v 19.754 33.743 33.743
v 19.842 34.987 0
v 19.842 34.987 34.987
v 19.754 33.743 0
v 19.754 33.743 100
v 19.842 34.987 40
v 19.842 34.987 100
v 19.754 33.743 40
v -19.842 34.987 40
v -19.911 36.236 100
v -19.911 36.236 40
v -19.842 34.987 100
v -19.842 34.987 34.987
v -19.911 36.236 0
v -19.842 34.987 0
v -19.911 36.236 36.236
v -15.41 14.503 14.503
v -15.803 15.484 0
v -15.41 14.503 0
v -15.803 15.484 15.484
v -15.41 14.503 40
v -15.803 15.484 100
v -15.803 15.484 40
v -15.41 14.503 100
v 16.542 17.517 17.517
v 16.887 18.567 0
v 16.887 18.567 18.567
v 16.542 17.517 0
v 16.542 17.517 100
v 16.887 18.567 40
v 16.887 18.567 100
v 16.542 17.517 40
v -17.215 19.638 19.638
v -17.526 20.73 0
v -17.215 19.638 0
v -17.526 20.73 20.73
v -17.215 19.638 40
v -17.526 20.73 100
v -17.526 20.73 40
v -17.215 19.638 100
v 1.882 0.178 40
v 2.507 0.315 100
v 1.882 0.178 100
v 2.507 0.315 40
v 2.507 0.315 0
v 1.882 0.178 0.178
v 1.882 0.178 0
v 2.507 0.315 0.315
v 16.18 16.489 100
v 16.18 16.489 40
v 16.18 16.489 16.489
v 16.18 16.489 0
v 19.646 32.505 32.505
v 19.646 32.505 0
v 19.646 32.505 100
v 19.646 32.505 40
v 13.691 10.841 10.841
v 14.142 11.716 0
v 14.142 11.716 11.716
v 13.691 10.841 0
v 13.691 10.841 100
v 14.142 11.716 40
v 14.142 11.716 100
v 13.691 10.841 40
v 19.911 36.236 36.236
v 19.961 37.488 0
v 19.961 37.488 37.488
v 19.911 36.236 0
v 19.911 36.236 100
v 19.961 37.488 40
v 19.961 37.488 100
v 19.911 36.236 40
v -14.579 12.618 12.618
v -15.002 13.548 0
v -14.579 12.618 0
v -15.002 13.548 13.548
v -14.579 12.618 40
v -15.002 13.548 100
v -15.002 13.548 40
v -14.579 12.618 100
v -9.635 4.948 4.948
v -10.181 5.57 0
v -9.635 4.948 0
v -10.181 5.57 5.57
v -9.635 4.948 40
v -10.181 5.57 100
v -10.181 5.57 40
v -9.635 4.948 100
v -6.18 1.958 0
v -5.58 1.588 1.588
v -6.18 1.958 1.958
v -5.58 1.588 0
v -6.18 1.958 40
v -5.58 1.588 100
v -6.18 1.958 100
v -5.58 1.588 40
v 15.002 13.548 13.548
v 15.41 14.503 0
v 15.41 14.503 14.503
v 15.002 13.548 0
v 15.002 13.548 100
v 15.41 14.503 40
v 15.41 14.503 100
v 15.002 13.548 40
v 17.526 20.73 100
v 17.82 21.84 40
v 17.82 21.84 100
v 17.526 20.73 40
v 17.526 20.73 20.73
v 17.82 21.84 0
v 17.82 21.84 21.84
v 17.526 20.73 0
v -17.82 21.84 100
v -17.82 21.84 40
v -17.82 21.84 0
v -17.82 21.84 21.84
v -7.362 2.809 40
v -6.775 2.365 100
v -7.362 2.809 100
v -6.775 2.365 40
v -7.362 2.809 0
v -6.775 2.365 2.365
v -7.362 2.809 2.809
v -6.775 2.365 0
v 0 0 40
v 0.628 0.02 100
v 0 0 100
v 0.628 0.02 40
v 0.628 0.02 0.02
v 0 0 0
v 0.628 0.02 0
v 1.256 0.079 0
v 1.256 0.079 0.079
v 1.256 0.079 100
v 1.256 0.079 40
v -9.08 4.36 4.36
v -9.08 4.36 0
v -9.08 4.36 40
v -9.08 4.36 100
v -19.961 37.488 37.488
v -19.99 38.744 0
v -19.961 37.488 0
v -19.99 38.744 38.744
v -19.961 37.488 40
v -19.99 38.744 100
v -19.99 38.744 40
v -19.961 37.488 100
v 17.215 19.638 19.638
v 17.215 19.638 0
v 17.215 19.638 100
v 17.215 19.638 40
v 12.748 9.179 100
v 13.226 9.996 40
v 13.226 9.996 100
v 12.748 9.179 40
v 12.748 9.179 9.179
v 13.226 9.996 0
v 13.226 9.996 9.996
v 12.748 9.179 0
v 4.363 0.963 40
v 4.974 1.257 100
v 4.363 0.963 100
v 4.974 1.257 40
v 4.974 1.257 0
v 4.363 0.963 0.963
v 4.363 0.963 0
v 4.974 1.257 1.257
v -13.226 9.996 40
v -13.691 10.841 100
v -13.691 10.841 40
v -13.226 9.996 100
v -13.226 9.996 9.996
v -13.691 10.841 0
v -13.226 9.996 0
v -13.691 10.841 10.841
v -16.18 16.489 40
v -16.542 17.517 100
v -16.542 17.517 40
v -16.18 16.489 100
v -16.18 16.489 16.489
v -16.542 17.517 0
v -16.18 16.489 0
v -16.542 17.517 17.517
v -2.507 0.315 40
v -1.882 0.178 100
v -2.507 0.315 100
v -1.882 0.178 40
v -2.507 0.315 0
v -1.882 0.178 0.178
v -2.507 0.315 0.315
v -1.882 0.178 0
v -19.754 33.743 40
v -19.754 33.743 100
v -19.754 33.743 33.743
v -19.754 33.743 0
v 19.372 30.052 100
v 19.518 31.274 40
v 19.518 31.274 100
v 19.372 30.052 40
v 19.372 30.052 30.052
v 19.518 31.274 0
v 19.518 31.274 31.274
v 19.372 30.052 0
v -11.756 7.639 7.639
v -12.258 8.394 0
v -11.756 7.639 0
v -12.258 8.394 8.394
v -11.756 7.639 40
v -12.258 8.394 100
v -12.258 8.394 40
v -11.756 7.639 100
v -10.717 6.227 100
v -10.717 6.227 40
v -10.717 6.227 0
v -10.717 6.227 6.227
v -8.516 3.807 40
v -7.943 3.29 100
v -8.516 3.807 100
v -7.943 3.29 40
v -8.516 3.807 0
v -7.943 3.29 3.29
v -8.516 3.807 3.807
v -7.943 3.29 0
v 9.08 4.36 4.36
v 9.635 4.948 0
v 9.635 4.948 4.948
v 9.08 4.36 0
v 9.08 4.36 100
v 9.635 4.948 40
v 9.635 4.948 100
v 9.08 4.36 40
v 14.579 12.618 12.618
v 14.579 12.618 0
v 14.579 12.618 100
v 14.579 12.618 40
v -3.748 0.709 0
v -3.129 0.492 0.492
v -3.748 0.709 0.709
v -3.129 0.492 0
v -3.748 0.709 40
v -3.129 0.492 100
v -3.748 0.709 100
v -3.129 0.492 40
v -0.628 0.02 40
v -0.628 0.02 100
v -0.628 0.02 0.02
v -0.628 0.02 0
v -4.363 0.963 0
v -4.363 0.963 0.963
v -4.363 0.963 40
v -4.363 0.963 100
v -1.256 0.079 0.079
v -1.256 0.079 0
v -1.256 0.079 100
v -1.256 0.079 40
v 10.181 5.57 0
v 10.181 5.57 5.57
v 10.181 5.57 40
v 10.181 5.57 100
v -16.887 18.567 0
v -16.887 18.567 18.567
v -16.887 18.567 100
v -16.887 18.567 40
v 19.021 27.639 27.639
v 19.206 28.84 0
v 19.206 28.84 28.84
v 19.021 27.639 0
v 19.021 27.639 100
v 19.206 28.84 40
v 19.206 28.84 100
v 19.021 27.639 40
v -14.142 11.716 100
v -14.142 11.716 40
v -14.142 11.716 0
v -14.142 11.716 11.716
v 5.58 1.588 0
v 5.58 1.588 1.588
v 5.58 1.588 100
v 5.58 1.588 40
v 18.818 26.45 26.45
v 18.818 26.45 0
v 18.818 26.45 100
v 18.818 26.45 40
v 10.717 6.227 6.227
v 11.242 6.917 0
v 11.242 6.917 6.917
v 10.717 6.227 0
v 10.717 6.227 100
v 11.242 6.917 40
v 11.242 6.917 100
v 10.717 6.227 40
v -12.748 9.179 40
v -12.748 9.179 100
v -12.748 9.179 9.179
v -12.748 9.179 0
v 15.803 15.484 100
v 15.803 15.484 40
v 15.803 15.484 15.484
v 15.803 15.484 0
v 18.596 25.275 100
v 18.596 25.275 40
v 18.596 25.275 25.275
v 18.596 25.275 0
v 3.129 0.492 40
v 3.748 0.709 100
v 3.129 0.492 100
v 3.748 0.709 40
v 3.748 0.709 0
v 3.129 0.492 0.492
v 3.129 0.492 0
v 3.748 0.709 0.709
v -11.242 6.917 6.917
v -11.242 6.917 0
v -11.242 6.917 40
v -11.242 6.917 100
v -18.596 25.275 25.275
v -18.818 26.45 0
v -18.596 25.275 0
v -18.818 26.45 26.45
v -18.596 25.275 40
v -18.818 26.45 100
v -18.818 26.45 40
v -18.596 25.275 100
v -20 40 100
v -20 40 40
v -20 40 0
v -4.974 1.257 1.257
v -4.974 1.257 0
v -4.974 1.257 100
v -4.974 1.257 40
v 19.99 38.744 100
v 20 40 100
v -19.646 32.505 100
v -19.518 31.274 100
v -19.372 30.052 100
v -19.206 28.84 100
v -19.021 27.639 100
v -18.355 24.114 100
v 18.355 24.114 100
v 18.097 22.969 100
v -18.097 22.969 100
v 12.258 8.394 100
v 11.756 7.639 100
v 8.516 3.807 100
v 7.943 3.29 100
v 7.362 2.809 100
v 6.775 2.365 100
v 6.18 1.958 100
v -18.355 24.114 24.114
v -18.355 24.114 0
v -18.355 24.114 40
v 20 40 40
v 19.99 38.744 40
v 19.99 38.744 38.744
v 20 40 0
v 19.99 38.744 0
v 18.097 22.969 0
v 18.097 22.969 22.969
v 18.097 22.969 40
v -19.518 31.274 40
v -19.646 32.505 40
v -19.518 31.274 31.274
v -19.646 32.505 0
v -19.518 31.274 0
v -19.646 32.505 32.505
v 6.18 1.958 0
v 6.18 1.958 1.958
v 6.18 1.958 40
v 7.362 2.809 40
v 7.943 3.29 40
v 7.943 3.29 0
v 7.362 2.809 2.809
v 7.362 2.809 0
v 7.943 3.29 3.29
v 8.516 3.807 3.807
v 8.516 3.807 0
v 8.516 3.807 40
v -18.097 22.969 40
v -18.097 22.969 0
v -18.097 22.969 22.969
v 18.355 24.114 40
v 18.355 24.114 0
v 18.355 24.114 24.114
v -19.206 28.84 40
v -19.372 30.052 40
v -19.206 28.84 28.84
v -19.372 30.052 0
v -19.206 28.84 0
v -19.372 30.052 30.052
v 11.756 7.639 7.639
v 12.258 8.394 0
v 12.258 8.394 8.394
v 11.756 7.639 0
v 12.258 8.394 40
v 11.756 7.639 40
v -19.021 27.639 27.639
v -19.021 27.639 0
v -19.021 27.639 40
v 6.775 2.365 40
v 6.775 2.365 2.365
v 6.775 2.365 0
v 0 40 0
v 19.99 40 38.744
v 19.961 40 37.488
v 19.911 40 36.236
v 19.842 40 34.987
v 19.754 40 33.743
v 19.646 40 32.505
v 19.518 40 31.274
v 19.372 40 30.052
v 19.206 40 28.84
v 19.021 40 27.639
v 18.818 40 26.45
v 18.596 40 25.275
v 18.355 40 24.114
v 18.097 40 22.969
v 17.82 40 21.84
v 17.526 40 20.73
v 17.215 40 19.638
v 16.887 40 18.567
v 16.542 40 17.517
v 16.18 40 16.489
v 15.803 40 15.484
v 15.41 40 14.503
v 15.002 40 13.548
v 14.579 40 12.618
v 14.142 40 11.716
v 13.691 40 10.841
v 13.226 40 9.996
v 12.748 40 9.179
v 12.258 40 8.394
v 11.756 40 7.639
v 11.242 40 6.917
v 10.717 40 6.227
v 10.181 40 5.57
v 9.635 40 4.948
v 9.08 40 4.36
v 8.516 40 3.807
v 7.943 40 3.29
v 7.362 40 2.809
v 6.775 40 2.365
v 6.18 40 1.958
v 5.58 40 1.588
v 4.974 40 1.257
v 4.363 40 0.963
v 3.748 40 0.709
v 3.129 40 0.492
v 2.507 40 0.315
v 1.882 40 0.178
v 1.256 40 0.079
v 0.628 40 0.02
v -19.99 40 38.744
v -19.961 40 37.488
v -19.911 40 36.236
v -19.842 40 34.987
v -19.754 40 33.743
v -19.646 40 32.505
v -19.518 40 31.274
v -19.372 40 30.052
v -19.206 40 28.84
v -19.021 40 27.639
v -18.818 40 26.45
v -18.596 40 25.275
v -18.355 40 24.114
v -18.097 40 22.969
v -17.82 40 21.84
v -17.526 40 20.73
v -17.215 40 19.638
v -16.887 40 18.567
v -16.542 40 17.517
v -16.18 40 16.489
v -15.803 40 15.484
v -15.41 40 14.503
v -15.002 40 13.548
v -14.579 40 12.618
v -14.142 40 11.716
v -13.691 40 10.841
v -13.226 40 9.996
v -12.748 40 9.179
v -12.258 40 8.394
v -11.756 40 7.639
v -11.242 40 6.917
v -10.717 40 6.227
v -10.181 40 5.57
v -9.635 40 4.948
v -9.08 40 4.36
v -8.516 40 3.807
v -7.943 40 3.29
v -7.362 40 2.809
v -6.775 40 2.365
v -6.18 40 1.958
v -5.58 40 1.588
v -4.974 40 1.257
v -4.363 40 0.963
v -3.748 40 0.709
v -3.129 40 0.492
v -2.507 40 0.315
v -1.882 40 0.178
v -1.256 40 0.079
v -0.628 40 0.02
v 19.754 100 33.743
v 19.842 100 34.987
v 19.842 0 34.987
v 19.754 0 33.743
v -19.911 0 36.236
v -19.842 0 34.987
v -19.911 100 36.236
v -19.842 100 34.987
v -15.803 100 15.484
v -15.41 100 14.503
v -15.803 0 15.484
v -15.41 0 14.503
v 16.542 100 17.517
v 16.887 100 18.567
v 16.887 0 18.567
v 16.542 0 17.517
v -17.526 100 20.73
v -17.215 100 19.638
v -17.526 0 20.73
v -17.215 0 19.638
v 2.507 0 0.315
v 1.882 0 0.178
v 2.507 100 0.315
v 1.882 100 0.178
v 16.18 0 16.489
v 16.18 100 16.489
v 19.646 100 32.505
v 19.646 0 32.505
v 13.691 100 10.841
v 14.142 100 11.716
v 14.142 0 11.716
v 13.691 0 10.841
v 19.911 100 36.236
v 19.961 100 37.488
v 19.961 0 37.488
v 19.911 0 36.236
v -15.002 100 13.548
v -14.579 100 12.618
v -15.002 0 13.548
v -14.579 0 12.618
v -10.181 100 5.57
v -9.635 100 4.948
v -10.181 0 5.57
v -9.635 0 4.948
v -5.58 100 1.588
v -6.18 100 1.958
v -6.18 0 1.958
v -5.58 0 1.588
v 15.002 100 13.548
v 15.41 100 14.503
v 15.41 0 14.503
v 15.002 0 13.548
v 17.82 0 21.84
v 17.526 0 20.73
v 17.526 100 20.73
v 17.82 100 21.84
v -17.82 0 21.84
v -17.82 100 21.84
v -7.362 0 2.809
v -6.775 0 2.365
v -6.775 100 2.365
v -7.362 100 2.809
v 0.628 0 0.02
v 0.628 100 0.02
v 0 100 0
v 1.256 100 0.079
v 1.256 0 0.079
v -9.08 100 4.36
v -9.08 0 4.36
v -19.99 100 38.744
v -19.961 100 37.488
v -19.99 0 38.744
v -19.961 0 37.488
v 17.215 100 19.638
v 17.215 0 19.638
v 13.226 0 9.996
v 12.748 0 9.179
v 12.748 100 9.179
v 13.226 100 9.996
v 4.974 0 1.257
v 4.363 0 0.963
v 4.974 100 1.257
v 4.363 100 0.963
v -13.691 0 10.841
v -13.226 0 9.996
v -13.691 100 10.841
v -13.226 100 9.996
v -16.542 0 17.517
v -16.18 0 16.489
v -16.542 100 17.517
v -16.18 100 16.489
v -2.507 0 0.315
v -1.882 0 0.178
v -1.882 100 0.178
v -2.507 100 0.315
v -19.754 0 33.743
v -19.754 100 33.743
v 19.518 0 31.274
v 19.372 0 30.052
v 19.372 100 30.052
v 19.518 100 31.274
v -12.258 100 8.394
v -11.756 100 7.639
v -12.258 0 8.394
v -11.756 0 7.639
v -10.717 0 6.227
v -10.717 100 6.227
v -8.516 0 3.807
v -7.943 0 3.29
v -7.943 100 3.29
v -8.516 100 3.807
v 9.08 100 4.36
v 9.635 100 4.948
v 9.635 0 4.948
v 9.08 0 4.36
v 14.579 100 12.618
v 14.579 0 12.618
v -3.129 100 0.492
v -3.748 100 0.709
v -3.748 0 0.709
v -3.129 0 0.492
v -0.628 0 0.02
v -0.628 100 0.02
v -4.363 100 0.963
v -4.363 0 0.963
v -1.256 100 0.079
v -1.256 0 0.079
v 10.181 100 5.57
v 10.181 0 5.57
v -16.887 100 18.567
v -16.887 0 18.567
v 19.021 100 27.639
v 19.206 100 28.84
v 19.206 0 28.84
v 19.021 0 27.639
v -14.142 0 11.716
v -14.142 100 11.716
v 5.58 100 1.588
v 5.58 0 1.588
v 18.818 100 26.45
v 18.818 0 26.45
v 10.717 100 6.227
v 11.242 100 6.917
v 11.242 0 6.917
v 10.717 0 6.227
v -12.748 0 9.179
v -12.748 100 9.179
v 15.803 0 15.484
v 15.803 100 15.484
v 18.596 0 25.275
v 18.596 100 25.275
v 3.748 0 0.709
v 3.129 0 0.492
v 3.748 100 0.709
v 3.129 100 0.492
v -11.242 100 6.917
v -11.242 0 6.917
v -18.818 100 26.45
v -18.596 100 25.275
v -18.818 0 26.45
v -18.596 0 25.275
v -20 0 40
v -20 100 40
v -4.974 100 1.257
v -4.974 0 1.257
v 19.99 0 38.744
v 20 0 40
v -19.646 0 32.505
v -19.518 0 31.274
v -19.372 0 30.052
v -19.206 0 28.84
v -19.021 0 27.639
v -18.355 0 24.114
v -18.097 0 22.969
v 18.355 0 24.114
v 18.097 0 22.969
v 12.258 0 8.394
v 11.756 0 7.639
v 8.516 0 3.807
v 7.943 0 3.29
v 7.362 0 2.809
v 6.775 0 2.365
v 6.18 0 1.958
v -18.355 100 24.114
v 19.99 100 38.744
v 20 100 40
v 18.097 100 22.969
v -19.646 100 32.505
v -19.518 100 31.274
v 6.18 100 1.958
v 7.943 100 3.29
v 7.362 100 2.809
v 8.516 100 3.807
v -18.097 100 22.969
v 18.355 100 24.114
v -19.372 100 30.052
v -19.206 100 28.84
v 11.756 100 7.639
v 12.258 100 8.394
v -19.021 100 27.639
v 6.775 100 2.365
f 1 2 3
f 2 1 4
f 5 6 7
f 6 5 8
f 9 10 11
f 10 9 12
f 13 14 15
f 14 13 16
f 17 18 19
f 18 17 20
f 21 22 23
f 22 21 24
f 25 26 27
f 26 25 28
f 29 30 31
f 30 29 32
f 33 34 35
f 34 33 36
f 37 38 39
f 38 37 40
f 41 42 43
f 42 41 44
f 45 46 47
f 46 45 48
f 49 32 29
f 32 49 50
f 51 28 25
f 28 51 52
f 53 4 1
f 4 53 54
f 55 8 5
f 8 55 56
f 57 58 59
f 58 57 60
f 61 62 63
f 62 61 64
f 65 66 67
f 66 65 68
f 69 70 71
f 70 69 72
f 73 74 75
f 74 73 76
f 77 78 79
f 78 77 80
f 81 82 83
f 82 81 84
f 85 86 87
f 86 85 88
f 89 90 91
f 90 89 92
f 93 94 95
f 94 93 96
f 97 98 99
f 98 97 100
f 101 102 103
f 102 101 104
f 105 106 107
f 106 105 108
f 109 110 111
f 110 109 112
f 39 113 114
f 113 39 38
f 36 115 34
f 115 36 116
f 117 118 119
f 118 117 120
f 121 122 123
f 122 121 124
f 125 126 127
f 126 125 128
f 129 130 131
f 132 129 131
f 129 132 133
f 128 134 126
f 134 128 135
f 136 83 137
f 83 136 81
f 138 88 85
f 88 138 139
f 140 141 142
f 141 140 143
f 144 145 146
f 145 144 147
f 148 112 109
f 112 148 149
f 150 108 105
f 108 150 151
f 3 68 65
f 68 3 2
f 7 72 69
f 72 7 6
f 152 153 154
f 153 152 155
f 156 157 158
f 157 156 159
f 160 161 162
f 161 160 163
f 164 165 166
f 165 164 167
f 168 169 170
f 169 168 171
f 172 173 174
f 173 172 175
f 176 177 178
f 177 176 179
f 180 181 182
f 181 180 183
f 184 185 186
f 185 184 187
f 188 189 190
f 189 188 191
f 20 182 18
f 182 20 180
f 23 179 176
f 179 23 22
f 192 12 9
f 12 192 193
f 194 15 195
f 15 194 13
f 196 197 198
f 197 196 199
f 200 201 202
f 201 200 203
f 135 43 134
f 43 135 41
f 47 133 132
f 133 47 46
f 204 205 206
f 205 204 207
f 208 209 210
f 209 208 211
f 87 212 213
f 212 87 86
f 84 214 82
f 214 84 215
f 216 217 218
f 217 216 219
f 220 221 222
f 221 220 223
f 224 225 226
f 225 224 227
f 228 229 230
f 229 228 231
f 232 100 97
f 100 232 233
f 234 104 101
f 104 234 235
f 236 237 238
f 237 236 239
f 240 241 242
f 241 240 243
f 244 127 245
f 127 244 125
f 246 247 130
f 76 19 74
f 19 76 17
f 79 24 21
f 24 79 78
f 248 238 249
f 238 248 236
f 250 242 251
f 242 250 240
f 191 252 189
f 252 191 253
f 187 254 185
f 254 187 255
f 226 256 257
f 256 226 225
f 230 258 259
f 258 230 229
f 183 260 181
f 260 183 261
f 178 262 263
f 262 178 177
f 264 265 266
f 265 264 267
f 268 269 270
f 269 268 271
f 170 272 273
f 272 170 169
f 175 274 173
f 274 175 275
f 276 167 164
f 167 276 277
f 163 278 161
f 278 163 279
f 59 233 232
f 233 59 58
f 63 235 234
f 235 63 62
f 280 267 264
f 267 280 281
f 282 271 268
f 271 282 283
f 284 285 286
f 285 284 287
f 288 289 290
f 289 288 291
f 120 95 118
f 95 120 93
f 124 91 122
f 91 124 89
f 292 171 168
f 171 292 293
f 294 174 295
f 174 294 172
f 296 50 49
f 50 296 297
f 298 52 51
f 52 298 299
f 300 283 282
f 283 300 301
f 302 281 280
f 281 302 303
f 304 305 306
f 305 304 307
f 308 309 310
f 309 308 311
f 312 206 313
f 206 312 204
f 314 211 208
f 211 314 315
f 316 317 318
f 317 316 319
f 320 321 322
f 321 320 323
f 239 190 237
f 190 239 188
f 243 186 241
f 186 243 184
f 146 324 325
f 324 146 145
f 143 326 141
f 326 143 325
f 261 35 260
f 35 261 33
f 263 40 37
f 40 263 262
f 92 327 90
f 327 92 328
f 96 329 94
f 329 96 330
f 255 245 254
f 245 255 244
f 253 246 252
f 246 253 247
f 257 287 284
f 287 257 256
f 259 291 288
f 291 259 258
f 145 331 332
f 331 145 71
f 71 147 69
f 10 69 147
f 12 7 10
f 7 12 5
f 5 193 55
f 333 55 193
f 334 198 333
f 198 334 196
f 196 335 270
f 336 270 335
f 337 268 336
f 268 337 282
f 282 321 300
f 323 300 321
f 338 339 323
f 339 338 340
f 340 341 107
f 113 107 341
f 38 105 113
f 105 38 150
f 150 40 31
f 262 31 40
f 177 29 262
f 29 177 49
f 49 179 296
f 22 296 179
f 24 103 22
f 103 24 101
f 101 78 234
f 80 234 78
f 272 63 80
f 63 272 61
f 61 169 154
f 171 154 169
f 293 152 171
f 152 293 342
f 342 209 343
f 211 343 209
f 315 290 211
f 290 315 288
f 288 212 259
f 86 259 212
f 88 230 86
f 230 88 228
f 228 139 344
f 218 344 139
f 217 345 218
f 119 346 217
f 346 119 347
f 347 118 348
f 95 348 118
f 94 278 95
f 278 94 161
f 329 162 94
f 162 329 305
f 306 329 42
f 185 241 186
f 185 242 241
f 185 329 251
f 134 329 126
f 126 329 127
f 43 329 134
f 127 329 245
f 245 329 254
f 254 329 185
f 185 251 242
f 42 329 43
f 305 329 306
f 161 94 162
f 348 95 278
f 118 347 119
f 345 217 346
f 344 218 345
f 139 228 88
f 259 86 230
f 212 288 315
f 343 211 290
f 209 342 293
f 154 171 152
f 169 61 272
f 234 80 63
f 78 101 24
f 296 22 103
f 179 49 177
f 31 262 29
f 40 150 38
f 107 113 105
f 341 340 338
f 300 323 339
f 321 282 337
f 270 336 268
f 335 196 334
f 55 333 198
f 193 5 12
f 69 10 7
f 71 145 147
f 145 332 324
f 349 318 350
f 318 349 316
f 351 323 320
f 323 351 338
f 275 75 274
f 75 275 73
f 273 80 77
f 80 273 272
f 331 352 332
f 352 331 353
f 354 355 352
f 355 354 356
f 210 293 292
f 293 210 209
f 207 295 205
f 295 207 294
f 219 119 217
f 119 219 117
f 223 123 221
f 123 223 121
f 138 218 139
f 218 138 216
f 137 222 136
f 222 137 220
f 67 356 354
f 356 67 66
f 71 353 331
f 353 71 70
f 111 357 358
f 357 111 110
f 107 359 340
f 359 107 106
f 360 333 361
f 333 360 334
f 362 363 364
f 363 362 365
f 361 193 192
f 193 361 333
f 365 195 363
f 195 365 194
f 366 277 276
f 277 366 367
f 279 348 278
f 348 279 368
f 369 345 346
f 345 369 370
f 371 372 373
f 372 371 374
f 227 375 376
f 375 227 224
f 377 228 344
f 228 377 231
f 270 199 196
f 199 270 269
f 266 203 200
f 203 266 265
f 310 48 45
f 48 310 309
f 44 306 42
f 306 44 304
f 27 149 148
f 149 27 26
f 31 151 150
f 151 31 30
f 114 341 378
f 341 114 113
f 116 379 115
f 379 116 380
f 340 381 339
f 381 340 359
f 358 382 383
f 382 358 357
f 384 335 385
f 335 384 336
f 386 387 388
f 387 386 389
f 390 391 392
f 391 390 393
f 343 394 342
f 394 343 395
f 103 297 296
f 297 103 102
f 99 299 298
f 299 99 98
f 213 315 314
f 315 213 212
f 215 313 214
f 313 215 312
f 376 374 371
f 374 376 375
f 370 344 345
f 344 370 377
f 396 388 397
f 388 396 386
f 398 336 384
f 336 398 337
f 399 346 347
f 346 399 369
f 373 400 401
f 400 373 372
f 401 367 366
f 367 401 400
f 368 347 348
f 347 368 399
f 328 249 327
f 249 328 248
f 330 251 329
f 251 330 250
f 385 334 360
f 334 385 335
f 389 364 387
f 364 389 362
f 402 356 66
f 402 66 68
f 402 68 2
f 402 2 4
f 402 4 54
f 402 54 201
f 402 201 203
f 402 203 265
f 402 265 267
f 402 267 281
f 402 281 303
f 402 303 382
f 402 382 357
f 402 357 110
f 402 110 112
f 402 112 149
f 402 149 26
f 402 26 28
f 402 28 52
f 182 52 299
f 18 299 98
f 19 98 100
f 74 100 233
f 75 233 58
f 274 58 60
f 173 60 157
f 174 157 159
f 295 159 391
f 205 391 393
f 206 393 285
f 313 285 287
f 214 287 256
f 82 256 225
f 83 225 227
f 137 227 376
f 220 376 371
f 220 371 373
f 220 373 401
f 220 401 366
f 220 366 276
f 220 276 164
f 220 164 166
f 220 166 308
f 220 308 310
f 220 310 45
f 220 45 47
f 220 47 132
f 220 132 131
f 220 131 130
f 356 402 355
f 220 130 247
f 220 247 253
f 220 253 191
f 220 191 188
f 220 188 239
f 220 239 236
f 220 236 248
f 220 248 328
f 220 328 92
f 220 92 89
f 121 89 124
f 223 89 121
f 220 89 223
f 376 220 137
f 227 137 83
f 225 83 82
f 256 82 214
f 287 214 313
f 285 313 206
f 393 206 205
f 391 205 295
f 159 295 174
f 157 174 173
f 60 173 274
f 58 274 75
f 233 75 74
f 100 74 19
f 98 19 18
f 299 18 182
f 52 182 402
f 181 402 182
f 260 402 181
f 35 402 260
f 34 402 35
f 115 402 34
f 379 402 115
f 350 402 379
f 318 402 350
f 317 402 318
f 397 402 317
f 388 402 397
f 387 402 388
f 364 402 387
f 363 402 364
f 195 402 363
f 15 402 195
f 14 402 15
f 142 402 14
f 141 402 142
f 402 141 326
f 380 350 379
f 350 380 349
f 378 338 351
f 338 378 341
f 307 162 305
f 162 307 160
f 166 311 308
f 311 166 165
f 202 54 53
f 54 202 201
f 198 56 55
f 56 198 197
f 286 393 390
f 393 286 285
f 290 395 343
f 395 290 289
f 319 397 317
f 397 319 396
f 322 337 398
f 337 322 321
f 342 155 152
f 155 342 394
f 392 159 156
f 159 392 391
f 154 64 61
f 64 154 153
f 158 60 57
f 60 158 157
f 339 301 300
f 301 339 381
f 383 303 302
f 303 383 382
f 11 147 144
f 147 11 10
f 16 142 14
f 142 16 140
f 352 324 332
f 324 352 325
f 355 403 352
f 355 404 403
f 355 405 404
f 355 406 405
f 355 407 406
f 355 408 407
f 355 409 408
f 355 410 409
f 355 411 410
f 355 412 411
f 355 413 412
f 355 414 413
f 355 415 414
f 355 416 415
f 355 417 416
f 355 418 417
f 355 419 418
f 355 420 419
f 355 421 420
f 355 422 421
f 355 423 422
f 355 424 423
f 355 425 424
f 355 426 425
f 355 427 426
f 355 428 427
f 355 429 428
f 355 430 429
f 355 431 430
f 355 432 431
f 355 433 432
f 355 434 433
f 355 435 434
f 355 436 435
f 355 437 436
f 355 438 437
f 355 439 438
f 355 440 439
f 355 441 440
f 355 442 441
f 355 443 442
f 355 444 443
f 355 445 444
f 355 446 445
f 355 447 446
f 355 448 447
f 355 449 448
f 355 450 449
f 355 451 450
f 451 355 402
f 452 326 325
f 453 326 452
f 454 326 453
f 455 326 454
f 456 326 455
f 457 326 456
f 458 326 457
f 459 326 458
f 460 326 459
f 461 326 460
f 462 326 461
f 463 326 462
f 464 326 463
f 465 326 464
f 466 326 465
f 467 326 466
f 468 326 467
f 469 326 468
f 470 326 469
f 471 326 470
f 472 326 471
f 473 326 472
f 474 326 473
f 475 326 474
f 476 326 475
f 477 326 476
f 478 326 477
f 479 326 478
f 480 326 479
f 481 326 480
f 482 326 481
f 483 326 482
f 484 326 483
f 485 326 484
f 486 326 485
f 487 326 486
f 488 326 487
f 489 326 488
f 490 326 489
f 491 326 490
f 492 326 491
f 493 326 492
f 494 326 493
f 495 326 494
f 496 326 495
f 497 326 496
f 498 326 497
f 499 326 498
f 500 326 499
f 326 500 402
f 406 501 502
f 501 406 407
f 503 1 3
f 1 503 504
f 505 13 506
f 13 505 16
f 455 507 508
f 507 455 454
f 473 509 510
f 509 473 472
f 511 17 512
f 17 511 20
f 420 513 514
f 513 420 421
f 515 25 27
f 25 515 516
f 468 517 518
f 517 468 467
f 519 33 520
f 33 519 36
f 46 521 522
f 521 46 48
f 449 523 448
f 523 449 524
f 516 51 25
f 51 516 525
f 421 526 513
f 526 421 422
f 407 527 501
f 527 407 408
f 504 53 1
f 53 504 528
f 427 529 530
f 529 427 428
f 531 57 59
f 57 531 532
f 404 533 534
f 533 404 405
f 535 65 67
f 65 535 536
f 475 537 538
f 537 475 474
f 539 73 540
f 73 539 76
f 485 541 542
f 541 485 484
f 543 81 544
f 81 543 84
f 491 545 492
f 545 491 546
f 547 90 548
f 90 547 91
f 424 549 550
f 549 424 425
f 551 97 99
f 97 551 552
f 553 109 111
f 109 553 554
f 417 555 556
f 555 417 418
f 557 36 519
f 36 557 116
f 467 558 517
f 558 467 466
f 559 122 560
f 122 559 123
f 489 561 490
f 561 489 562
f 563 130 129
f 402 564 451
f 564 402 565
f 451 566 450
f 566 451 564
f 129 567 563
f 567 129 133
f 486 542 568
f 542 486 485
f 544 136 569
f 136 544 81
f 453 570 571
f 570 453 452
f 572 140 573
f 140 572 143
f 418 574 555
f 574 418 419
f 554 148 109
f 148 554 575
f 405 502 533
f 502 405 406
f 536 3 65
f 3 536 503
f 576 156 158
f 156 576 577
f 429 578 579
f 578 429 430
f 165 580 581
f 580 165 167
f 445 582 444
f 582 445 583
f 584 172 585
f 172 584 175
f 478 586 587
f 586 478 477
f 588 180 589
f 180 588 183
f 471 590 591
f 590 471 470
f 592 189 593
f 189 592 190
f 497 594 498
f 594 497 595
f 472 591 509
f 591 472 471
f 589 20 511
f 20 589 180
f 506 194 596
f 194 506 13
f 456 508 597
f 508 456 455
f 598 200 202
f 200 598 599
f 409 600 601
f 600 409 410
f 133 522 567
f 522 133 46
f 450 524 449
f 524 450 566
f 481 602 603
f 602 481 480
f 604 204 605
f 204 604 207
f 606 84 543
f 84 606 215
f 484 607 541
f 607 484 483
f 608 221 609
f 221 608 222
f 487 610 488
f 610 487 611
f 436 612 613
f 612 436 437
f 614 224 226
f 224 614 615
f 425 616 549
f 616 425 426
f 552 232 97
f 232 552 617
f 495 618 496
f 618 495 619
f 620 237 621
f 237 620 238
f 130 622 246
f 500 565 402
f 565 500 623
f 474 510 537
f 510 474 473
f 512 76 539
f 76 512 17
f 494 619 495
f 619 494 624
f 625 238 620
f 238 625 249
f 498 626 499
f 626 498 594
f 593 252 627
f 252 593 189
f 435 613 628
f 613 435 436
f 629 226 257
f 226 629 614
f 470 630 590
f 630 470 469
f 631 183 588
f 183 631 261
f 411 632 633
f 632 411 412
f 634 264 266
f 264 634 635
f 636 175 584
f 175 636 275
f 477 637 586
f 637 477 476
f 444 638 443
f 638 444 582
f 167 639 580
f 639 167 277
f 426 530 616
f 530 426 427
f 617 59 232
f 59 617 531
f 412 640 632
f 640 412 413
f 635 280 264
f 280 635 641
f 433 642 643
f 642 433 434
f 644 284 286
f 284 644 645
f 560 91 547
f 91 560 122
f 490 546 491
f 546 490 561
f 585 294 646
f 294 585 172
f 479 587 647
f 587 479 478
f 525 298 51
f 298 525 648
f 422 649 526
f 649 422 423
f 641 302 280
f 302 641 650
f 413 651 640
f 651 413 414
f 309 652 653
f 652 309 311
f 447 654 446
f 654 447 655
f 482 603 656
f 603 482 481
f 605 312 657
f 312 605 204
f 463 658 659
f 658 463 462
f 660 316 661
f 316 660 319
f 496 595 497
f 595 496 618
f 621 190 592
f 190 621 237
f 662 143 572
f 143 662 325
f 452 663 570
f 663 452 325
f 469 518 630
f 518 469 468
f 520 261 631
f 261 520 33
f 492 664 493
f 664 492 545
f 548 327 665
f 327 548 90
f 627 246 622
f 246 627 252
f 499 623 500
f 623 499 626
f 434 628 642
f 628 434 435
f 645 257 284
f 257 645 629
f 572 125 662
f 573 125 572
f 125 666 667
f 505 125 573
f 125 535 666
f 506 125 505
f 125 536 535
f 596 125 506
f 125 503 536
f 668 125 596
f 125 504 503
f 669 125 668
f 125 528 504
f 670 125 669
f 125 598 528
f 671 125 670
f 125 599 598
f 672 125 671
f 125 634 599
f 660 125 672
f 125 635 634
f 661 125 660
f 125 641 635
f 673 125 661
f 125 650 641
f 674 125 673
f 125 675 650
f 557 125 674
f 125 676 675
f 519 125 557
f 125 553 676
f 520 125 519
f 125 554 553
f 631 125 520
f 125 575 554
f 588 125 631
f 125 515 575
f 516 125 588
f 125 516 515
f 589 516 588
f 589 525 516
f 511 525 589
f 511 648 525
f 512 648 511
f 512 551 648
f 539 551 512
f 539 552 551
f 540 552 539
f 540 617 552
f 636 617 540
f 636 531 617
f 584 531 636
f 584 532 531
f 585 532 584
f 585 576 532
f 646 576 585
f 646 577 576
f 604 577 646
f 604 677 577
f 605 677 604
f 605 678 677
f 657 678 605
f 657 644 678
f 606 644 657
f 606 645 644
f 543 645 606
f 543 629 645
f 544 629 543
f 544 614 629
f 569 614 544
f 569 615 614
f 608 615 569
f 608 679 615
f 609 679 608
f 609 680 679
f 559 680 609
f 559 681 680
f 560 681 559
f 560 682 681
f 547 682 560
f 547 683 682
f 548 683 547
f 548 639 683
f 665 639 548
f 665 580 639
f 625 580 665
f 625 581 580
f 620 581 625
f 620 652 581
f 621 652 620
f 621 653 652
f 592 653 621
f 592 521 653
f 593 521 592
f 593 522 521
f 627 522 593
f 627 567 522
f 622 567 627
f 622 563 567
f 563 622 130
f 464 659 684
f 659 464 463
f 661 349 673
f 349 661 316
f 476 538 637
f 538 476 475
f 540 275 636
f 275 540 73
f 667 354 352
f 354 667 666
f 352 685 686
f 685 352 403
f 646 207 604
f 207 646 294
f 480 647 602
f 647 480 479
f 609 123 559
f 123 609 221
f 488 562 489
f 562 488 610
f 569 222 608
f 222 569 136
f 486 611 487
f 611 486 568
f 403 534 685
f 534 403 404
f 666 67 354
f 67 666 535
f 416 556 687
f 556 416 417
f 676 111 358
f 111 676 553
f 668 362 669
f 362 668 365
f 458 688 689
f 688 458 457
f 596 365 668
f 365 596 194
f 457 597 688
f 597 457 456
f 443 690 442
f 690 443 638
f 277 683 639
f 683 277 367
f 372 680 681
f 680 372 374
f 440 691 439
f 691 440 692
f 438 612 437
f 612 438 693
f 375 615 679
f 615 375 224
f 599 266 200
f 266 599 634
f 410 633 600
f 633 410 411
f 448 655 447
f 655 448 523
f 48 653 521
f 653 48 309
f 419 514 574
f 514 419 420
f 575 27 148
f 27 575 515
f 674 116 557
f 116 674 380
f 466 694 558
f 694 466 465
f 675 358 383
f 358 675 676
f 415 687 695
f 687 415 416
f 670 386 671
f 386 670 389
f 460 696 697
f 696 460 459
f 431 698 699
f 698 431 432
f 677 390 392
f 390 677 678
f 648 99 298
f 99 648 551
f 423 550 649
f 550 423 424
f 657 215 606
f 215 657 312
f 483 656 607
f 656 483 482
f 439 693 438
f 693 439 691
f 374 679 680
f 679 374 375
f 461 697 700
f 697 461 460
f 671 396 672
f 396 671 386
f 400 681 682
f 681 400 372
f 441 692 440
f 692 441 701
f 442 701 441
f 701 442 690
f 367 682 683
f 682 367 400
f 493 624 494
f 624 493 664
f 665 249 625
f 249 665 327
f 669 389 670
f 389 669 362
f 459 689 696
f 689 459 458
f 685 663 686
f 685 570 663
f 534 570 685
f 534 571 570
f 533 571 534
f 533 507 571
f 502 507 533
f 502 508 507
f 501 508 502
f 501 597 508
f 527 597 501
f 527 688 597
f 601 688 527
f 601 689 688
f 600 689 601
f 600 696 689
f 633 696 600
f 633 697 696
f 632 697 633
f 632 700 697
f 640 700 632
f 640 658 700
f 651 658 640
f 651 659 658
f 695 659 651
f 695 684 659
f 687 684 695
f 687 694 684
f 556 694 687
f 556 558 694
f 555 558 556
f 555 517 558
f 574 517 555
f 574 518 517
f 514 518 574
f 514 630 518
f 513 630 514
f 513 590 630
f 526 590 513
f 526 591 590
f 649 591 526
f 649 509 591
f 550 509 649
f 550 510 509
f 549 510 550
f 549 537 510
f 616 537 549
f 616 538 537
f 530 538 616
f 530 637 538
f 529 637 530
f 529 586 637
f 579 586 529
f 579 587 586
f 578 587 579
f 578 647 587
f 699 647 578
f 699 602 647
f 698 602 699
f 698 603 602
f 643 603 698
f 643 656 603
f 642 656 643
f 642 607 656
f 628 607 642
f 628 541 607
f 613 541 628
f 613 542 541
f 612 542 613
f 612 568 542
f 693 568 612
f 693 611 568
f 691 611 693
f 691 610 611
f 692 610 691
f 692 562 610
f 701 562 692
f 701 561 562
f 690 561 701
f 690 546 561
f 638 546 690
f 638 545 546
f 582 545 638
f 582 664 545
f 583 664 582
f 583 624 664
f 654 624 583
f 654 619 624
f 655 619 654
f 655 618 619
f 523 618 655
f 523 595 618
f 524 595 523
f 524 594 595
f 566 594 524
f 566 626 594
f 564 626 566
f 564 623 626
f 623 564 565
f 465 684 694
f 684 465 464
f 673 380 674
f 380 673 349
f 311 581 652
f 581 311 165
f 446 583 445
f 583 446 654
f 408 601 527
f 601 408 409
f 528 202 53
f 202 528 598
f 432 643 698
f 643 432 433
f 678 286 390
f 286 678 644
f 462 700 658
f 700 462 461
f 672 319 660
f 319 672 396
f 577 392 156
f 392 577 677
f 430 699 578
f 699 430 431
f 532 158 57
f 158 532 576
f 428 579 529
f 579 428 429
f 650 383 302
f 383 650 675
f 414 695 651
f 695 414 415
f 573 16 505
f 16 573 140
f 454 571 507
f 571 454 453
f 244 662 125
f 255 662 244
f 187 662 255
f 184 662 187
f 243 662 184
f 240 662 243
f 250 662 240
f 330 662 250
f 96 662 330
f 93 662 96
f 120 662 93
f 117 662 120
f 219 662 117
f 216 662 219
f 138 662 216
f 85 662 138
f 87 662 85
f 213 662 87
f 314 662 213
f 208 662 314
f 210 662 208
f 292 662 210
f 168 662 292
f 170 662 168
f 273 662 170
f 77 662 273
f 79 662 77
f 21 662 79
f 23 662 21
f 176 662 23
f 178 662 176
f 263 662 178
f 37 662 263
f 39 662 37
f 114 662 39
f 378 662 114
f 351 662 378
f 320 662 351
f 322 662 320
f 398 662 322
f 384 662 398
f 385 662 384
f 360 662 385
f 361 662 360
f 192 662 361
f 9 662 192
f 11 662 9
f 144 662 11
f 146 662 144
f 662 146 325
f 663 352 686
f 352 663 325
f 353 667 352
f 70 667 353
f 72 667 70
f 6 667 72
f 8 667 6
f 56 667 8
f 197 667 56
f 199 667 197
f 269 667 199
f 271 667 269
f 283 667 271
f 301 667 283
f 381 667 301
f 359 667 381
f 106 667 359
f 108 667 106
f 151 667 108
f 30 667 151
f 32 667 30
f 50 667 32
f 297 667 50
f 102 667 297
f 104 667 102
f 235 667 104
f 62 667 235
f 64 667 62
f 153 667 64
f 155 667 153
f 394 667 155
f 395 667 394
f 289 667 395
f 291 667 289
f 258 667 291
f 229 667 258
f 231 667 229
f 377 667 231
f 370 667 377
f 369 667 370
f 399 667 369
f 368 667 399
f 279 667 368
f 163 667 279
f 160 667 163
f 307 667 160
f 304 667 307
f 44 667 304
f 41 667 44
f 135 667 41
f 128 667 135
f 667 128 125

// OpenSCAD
 
translate([0,40,0]){     
    difference(){
    union(){
        linear_extrude(center=false,  $fn=200)
        scale([1,2])circle(r=20); 
        translate([-40,0,0]){
           cube([80,80,100]); } }
   intersection(){
       linear_extrude(center=false,  $fn=200)
       scale([1,2])circle(r=20); 
       translate([-20,0,0]){
         cube([80,80,100]); } 
         }
    translate([-40,0,0]){
       cube([80,80,100]); }     
         
         }}
translate([0,100,40]){        
  rotate([90,0,0]){
  difference(){
    union(){
        linear_extrude(center=false,  $fn=200)
        scale([1,2])circle(r=20);
        translate([-40,0,0]){
           cube([80,80,100]); } }
   intersection(){
       linear_extrude(center=false,  $fn=200)
       scale([1,2])circle(r=20); 
       translate([-20,0,0]){
         cube([80,80,100]); } 
         }
    translate([-40,0,0]){
       cube([80,80,100]); }     
         
         }}
     }  
   
